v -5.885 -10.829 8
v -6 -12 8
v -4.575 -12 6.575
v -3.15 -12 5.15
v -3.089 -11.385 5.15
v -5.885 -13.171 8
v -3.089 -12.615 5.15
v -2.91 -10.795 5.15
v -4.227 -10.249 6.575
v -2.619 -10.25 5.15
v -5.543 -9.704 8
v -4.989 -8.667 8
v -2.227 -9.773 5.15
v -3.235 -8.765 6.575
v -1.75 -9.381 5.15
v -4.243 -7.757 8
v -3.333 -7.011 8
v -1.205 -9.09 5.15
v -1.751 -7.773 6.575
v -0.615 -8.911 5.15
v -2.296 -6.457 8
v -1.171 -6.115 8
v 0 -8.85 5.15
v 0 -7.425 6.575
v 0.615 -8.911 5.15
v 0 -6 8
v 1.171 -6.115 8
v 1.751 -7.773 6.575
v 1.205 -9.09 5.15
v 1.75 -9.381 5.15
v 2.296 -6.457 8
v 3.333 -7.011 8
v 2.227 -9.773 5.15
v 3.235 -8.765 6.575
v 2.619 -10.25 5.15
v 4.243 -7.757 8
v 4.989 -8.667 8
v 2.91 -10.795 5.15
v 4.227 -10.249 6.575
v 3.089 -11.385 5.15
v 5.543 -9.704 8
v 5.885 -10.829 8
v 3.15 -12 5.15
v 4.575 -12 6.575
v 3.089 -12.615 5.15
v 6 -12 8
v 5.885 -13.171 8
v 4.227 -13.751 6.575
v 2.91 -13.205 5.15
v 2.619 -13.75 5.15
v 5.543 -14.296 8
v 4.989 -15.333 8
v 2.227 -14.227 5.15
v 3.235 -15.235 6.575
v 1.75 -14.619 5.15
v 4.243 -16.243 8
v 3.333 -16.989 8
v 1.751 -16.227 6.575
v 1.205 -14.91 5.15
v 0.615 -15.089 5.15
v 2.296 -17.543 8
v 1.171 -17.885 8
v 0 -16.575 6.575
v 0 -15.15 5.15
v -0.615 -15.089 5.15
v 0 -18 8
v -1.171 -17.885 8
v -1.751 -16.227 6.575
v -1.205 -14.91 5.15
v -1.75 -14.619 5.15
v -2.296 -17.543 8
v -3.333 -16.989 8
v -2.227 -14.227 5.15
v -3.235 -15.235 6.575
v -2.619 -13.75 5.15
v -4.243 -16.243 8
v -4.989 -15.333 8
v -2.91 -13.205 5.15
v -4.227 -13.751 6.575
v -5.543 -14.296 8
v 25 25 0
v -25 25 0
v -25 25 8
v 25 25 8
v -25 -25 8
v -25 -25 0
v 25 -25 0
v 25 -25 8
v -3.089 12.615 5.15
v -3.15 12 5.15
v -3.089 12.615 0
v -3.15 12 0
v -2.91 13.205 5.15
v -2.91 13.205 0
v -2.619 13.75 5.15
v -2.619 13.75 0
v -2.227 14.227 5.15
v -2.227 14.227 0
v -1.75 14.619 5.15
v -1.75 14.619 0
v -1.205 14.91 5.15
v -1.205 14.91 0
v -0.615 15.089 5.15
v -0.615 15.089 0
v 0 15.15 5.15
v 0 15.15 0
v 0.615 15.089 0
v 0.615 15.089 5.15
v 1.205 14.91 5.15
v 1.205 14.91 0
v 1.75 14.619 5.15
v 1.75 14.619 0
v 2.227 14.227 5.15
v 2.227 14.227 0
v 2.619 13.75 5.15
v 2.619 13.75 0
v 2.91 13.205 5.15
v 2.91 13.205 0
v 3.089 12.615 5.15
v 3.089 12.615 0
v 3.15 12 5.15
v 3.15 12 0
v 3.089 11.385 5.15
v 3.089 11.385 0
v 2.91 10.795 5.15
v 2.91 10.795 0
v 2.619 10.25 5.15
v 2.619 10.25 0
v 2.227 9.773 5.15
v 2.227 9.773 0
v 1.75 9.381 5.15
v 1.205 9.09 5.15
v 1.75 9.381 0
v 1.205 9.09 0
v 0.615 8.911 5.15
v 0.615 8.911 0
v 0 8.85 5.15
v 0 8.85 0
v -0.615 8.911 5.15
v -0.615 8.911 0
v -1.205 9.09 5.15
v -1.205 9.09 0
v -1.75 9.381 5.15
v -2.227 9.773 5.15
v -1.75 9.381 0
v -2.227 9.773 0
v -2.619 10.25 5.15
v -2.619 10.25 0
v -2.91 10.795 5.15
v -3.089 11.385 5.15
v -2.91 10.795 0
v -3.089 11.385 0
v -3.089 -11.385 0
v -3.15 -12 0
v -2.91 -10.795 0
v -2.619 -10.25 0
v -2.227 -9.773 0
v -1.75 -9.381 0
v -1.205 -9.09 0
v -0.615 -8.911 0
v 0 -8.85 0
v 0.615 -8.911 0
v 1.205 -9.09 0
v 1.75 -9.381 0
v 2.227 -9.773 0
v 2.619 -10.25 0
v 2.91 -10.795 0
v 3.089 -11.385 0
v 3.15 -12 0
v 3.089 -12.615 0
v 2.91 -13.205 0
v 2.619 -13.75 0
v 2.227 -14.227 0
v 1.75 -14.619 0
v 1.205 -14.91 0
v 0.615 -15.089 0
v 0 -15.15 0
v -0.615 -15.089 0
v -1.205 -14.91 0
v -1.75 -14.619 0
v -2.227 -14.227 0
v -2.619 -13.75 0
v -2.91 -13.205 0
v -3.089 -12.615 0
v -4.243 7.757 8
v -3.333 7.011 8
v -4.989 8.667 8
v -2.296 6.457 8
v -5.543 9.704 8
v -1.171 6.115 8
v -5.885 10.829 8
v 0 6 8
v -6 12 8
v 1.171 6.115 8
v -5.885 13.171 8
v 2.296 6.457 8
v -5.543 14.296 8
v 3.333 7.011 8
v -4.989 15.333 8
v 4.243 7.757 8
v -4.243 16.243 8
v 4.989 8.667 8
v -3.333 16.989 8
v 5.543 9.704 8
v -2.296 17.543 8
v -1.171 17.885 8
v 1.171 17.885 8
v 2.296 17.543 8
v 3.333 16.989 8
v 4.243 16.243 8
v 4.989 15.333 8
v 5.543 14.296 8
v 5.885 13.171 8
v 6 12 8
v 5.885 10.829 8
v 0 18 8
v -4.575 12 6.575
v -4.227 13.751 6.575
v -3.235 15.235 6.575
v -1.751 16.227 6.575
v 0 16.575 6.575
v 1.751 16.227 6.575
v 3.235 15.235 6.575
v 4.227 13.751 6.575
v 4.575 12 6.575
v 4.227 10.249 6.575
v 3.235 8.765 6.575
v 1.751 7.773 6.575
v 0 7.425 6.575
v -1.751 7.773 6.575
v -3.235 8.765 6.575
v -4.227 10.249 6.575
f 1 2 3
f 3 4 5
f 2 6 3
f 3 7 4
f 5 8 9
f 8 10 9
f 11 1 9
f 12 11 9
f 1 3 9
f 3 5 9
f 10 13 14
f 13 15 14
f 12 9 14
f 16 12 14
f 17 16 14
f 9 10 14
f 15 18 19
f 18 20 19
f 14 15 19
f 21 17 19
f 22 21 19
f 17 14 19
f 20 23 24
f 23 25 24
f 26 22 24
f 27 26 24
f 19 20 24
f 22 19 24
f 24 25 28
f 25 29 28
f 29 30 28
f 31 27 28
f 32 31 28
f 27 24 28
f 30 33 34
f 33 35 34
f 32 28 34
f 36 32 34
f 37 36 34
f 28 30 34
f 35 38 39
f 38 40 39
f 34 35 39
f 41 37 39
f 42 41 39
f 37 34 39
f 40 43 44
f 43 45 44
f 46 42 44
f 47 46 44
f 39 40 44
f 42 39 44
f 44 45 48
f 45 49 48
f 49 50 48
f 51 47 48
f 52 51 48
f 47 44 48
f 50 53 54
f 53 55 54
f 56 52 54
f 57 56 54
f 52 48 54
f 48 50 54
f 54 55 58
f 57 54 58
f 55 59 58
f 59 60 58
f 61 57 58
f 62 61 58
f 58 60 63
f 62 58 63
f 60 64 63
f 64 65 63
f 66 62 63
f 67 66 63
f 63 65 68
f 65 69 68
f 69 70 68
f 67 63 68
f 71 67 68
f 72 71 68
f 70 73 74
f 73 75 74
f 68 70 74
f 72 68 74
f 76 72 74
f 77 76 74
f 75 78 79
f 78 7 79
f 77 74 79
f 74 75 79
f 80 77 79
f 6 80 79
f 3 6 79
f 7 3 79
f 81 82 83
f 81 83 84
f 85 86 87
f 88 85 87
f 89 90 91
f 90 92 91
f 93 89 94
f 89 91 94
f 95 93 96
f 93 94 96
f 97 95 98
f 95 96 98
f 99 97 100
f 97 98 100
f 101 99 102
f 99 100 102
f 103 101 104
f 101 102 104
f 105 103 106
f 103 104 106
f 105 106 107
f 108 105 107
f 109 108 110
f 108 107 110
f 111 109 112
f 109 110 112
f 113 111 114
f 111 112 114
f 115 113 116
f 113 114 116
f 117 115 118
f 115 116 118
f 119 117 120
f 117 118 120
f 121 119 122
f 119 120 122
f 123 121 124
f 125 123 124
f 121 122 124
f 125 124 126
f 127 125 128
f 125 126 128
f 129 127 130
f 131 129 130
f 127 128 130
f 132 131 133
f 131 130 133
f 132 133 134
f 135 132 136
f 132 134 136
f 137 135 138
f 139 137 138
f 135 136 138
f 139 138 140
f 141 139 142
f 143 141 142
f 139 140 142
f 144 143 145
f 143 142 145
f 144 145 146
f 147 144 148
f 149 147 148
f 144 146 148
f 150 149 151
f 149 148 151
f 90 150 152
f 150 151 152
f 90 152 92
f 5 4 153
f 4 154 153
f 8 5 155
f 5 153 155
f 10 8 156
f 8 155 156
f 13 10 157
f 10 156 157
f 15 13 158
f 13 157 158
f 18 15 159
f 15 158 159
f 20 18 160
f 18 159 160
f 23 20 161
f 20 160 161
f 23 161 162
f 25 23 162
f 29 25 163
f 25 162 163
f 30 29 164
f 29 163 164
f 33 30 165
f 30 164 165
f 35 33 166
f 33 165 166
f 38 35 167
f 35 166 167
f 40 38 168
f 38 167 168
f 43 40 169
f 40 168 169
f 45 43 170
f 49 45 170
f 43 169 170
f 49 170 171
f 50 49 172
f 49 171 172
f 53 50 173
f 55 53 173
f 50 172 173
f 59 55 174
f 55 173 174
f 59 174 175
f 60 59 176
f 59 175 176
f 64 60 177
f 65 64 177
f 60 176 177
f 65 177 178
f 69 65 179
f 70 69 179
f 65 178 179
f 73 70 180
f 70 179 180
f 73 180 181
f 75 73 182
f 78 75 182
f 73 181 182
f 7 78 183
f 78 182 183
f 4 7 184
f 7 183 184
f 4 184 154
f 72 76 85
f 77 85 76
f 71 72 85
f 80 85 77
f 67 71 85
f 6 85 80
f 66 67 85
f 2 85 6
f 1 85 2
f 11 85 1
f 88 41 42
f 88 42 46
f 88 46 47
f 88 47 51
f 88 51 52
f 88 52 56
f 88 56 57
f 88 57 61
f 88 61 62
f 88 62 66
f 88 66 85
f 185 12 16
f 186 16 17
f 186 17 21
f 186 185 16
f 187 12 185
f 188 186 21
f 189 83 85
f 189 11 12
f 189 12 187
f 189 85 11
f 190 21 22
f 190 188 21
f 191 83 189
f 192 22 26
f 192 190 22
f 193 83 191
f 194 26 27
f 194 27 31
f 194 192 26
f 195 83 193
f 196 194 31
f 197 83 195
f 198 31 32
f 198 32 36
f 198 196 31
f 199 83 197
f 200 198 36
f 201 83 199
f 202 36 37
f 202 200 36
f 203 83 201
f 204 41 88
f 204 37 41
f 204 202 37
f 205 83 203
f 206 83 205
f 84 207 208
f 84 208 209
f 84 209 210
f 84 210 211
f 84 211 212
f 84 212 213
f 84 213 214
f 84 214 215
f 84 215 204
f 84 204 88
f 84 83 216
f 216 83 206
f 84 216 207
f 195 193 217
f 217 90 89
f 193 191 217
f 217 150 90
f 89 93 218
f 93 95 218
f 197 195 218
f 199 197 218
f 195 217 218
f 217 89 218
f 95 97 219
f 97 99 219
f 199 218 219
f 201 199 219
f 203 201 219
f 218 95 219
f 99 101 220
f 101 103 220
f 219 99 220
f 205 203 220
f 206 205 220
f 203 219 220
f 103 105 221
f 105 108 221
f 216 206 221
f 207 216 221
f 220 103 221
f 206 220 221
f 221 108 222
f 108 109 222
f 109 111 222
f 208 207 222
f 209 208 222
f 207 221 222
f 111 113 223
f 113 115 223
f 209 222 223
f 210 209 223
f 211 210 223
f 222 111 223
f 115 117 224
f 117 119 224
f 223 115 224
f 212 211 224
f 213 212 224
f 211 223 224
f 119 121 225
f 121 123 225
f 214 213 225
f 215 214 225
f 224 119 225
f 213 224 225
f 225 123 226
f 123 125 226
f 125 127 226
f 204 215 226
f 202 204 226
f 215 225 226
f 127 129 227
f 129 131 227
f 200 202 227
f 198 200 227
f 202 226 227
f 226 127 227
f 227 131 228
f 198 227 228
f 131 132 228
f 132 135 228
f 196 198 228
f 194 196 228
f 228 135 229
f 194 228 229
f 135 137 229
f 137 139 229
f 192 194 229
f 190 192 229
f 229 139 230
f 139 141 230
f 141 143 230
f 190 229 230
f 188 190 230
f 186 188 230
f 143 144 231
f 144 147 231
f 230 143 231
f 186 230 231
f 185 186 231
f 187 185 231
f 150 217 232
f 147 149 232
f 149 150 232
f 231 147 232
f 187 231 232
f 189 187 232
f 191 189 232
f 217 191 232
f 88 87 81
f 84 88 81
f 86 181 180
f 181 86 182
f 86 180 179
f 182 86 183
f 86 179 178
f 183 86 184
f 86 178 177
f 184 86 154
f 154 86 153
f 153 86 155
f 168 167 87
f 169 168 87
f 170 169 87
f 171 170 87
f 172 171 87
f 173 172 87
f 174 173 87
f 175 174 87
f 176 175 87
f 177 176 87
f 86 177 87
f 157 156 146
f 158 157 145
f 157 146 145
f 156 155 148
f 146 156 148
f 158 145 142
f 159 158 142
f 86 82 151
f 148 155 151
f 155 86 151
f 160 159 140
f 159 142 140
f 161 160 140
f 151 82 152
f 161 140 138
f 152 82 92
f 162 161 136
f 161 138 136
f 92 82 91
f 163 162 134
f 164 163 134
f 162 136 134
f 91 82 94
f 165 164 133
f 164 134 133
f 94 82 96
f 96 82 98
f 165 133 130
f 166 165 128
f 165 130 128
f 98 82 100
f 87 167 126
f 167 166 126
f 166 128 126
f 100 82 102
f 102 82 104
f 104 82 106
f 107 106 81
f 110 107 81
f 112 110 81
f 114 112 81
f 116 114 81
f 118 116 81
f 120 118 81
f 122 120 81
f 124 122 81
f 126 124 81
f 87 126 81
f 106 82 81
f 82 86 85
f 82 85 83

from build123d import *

# Parameters (mm, degrees)
SKETCH1_W           = 50
SKETCH1_H           = 50
BOSS_EXTRUDE1_DEPTH = 8
HOLE1_D             = 6.3
HOLE1_CSINK_D       = 12
HOLE1_CSINK_ANGLE   = 90


with BuildPart() as part:
    # Sketch1 → Boss-Extrude1 (new body)
    with BuildSketch(Plane.XY):
        Rectangle(SKETCH1_W, SKETCH1_H)
    extrude(amount=BOSS_EXTRUDE1_DEPTH)

    # Hole1 (through all)
    with Locations(Plane(origin=(0, 12, 8), x_dir=(1, 0, 0), z_dir=(0, 0, 1))):
        with Locations((0, 0), (0, -24)):
            CounterSinkHole(HOLE1_D / 2, HOLE1_CSINK_D / 2, counter_sink_angle=HOLE1_CSINK_ANGLE)


solid = part.part
